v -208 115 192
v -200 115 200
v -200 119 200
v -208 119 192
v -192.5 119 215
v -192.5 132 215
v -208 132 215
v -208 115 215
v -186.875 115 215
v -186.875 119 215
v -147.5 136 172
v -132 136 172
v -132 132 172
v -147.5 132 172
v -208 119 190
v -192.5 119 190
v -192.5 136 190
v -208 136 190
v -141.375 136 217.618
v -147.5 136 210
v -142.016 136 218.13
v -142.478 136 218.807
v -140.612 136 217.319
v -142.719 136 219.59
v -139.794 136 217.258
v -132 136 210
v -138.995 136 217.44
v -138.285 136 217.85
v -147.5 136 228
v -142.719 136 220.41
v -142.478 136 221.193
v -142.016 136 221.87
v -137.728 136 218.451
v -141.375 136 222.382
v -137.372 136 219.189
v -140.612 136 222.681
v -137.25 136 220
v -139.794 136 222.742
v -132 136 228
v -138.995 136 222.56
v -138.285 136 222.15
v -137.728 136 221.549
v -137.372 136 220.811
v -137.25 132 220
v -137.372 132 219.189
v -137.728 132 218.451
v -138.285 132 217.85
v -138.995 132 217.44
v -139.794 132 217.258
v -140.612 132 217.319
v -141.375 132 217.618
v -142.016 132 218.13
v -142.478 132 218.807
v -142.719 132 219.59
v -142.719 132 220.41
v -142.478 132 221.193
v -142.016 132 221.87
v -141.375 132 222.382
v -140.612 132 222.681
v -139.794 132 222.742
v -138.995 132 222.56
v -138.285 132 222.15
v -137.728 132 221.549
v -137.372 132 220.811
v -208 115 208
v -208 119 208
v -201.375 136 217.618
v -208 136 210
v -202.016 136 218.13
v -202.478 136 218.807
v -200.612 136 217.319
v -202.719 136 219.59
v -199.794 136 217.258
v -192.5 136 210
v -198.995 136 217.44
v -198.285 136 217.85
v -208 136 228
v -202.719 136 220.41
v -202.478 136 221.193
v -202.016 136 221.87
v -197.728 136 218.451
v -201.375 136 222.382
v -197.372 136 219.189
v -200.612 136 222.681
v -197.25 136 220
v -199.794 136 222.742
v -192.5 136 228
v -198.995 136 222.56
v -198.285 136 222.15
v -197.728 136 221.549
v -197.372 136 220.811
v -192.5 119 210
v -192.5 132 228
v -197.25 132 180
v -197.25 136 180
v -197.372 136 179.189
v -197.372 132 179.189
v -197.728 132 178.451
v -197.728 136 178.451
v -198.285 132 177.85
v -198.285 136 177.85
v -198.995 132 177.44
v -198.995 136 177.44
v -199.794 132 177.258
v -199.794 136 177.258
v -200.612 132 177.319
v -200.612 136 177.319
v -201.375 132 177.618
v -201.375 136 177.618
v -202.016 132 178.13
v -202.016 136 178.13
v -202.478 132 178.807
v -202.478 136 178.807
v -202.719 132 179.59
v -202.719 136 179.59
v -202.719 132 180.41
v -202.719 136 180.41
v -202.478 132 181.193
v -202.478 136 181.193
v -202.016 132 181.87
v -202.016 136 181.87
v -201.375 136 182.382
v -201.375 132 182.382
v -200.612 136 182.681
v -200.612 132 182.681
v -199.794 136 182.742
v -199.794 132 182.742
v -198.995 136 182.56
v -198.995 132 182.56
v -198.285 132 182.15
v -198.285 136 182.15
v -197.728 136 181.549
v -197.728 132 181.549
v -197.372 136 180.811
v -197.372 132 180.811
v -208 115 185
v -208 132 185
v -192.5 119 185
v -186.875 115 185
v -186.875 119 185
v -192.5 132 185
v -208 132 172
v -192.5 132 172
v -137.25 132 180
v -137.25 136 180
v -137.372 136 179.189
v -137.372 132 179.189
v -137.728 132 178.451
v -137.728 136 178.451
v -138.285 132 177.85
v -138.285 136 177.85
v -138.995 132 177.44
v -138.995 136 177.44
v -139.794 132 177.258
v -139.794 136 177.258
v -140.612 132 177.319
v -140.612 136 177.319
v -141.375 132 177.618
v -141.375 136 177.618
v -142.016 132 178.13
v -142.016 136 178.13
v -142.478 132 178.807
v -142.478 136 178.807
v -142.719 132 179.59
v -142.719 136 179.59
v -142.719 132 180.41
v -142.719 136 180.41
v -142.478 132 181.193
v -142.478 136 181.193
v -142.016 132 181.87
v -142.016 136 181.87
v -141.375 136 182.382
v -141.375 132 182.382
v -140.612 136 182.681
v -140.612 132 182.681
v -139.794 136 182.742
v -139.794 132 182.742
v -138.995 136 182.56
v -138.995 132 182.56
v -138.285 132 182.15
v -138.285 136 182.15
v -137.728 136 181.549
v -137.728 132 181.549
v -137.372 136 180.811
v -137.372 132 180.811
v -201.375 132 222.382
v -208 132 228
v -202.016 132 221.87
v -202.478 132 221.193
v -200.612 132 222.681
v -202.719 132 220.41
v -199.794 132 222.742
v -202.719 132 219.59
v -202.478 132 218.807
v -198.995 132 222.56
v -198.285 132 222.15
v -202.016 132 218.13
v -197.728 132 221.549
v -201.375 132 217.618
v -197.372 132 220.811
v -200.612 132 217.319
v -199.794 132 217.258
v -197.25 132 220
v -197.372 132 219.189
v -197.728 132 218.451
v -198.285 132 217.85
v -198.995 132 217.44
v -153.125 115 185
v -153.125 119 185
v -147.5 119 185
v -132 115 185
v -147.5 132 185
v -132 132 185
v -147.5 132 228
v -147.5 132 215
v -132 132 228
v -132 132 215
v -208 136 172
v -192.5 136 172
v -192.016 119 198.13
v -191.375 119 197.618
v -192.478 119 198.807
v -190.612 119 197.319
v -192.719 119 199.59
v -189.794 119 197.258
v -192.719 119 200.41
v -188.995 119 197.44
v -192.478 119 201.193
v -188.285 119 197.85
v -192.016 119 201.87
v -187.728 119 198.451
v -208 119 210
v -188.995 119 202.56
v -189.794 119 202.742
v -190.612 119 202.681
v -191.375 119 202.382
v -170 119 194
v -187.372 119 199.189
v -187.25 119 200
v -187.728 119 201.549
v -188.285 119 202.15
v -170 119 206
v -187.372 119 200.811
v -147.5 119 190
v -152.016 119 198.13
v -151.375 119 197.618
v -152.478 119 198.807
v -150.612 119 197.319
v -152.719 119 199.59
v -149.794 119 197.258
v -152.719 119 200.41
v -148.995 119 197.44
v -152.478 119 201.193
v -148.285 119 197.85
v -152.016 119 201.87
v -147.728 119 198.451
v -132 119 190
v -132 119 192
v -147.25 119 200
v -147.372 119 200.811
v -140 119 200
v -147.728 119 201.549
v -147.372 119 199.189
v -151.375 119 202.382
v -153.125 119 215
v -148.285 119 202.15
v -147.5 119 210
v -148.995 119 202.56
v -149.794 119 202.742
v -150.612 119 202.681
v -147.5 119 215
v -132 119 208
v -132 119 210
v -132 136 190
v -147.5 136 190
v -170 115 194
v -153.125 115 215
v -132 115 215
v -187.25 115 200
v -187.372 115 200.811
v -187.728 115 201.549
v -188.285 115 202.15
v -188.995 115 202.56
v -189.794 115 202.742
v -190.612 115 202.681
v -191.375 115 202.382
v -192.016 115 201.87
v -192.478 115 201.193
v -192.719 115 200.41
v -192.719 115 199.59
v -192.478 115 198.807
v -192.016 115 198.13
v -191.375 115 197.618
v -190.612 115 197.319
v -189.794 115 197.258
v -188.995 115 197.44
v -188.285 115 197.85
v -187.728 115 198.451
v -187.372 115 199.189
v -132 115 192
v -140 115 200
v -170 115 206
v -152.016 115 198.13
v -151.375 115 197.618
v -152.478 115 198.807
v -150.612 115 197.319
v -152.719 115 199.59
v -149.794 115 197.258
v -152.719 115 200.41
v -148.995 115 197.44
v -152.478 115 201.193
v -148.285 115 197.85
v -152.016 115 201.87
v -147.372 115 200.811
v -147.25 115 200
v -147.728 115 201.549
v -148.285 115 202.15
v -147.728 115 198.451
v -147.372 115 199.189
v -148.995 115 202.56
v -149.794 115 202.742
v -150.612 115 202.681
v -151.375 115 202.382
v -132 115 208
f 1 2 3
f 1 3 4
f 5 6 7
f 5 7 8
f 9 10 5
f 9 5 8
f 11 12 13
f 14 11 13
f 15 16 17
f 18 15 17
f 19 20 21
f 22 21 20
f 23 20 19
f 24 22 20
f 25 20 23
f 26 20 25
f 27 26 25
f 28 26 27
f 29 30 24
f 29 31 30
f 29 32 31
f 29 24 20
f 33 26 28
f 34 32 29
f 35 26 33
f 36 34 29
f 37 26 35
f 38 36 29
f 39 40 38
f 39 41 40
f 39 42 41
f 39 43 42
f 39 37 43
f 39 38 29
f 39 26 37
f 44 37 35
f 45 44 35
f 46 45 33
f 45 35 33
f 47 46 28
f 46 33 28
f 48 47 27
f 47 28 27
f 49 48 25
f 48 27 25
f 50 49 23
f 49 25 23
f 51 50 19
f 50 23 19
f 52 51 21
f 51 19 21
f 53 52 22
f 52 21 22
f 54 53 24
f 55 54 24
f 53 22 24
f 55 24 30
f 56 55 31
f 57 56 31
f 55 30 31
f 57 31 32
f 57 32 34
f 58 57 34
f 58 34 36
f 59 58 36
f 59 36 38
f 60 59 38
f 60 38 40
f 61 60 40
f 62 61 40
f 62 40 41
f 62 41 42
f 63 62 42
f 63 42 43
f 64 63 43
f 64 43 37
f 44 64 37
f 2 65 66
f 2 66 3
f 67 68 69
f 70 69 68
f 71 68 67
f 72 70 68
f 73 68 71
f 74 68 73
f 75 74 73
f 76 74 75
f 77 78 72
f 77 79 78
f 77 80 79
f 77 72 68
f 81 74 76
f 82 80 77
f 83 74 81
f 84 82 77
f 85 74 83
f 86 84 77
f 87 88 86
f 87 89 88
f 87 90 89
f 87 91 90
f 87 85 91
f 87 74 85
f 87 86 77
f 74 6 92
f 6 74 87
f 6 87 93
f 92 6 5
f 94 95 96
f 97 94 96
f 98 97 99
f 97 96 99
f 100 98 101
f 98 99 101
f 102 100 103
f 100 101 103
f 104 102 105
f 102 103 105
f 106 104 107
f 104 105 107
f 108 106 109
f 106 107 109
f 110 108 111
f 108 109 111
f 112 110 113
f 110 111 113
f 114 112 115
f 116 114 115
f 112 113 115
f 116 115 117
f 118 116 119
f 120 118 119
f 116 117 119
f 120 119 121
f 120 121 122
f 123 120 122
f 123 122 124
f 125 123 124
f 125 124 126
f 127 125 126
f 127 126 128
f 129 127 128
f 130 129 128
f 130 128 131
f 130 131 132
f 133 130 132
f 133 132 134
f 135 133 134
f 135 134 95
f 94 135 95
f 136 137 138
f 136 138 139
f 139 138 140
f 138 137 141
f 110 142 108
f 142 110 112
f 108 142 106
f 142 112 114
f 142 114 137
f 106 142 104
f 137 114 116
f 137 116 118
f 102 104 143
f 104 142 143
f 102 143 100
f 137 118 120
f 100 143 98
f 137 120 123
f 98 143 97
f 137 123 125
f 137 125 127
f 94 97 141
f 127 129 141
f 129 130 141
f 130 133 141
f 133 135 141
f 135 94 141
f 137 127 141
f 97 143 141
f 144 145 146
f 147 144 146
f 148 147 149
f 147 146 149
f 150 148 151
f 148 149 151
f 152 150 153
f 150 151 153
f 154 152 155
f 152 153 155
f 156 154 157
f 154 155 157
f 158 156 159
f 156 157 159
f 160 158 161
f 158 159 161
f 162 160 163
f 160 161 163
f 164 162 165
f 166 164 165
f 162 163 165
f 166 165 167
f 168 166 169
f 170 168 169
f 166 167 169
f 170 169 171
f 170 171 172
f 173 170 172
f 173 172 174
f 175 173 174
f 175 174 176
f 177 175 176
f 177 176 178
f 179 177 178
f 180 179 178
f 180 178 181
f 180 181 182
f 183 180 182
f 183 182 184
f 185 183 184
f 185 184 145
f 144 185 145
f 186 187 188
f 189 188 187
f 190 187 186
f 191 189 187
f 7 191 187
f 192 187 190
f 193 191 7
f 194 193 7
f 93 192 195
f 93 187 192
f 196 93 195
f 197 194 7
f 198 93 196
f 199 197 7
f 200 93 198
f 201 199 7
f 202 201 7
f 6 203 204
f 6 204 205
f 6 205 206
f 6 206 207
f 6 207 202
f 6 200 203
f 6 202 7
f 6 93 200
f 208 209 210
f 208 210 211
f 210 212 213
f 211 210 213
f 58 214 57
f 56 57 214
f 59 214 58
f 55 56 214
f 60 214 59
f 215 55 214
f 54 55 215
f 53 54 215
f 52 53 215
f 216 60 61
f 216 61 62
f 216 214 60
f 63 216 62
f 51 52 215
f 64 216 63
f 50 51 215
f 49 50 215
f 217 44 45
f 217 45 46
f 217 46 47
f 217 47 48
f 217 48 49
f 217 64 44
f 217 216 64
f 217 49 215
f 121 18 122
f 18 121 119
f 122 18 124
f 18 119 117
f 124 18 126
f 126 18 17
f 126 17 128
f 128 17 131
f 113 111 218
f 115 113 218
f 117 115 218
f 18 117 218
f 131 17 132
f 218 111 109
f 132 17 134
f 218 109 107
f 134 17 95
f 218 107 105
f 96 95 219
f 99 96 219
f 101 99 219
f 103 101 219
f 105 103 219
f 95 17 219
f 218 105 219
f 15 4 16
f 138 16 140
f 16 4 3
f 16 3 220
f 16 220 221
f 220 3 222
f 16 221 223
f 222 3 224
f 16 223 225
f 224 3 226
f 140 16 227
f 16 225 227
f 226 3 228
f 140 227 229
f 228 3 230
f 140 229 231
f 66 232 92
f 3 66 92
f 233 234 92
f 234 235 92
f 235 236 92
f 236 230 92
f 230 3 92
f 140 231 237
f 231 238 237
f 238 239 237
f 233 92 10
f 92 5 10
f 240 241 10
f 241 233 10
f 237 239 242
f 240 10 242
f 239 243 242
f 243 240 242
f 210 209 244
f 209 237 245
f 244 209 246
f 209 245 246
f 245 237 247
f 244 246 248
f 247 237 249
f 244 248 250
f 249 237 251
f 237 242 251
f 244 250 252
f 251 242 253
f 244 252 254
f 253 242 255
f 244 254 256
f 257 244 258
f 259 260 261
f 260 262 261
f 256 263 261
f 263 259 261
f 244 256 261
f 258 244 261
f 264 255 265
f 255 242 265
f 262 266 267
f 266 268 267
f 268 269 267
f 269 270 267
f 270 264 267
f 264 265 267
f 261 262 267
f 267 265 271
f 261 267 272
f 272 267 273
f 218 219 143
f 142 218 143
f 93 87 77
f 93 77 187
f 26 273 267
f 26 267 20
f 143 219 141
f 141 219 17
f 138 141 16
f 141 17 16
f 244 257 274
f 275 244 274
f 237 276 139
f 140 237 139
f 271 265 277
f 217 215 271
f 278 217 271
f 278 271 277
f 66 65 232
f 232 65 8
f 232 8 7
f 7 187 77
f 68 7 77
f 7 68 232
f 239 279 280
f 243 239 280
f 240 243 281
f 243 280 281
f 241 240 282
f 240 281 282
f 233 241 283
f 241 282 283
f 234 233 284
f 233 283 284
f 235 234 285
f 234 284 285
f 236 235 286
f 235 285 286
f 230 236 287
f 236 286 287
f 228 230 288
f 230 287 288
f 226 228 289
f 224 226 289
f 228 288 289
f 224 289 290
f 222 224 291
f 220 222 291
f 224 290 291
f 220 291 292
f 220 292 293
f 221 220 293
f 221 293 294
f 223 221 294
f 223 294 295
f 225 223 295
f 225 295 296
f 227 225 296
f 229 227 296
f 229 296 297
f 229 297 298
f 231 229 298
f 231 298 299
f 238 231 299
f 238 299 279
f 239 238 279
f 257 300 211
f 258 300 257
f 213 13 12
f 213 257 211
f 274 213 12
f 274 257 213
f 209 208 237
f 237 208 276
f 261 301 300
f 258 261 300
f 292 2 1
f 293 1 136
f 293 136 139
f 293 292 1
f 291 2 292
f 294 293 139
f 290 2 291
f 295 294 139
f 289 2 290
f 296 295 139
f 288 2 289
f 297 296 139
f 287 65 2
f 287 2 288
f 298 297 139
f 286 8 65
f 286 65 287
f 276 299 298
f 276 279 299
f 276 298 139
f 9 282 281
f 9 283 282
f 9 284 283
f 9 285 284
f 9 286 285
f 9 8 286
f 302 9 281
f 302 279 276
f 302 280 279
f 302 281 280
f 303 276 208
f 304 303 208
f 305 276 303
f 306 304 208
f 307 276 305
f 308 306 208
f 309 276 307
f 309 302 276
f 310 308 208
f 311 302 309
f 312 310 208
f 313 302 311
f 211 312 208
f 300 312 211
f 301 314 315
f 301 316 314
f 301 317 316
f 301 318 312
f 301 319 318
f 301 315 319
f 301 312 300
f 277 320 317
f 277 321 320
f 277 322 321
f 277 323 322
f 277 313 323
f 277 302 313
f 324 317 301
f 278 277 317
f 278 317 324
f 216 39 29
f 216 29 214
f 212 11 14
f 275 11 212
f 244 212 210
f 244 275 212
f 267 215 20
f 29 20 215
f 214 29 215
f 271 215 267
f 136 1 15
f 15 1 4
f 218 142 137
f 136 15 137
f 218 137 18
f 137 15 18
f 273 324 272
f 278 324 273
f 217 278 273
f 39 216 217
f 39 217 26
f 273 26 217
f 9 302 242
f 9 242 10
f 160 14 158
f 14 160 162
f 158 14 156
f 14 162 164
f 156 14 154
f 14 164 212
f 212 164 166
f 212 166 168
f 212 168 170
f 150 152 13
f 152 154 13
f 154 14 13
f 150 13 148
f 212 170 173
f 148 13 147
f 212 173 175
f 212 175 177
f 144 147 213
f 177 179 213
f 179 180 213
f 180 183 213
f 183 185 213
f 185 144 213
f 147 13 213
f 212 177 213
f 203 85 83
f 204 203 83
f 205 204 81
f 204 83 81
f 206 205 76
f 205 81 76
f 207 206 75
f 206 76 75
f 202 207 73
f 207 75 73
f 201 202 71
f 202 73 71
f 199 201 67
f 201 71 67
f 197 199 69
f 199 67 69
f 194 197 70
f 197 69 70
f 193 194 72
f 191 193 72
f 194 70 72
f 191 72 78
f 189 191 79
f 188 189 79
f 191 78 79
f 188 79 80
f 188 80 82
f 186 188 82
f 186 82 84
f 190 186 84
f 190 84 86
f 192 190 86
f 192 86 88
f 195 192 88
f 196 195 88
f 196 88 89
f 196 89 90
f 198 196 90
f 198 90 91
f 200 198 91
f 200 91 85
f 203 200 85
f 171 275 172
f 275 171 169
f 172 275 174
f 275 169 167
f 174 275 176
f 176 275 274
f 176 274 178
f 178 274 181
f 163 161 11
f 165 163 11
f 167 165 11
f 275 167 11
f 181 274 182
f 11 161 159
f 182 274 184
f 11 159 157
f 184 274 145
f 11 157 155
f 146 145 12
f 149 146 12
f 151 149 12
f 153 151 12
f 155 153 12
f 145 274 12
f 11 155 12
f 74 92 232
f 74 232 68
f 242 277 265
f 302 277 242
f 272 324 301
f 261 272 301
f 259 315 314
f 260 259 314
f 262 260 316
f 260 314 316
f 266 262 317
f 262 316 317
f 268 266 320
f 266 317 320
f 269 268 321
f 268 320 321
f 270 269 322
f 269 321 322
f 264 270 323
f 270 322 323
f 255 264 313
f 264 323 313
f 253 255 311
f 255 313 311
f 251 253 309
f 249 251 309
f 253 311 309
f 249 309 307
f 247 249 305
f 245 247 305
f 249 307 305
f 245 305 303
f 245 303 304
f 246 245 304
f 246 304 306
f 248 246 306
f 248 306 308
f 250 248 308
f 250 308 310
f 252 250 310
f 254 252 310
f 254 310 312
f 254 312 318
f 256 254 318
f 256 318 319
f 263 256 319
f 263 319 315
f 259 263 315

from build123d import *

# Parameters (mm, degrees)
SKETCH023_W     = 76
SKETCH023_H     = 30
PAD006_DEPTH    = 4
PAD007_DEPTH    = 76
SKETCH028_R     = 2.75
HOLE004_DEPTH   = 24.001
SKETCH032_R     = 2.75
HOLE005_DEPTH   = 25.001
SKETCH033_W     = 45
SKETCH033_H     = 20
POCKET010_DEPTH = 56.001
POCKET011_DEPTH = 21.001


with BuildPart() as part:
    # Sketch023 → Pad006 (new body)
    with BuildSketch(Plane.XZ):
        with Locations((-170, 200)):
            Rectangle(SKETCH023_W, SKETCH023_H)
    extrude(amount=PAD006_DEPTH)

    # Sketch024 → Pad007 (join)
    with BuildSketch(Plane.YZ.offset(-132)):
        Polygon((0, 215), (0, 210), (17, 210), (17, 228), (13, 228), (13, 215), align=None)
        Polygon((0, 190), (17, 190), (17, 172), (13, 172), (13, 185), (0, 185), align=None)
    extrude(amount=-PAD007_DEPTH)

    # Sketch028 → Hole004 (cut, through all)
    with BuildSketch(Plane(origin=(0, 20, 0), x_dir=(1, 0, 0), z_dir=(0, 1, 0))):
        with Locations((-200, -220)):
            Circle(SKETCH028_R)
        with Locations((-200, -180)):
            Circle(SKETCH028_R)
        with Locations((-140, -180)):
            Circle(SKETCH028_R)
        with Locations((-140, -220)):
            Circle(SKETCH028_R)
    extrude(amount=-HOLE004_DEPTH, mode=Mode.SUBTRACT)

    # Sketch032 → Hole005 (cut, through all)
    with BuildSketch(Plane.XZ.offset(8)):
        with Locations((-190, 200)):
            Circle(SKETCH032_R)
        with Locations((-150, 200)):
            Circle(SKETCH032_R)
    extrude(amount=-HOLE005_DEPTH, mode=Mode.SUBTRACT)

    # Sketch033 (on Face22 of Hole005) → Pocket010 (cut, through all)
    with BuildSketch(Plane(origin=(0, 0, 228), x_dir=(-1, 0, 0), z_dir=(0, 0, 1))):
        with Locations((170, -10)):
            Rectangle(SKETCH033_W, SKETCH033_H)
    extrude(amount=-POCKET010_DEPTH, mode=Mode.SUBTRACT)

    # Sketch034 (on Face7 of Pocket010) → Pocket011 (cut, through all)
    with BuildSketch(Plane.XZ.offset(4)):
        Polygon((-210, 210), (-200, 200), (-210, 190), align=None)
        Polygon((-130, 210), (-140, 200), (-130, 190), align=None)
        Polygon((-192.5, 218), (-147.5, 218), (-170, 206), align=None)
        Polygon((-192.5, 182), (-147.5, 182), (-170, 194), align=None)
    extrude(amount=-POCKET011_DEPTH, mode=Mode.SUBTRACT)


with BuildPart() as part_1:
    # Body004 placement: moved
    add(part.part.moved(Location((0, 119, 0))))


solid = part_1.part
